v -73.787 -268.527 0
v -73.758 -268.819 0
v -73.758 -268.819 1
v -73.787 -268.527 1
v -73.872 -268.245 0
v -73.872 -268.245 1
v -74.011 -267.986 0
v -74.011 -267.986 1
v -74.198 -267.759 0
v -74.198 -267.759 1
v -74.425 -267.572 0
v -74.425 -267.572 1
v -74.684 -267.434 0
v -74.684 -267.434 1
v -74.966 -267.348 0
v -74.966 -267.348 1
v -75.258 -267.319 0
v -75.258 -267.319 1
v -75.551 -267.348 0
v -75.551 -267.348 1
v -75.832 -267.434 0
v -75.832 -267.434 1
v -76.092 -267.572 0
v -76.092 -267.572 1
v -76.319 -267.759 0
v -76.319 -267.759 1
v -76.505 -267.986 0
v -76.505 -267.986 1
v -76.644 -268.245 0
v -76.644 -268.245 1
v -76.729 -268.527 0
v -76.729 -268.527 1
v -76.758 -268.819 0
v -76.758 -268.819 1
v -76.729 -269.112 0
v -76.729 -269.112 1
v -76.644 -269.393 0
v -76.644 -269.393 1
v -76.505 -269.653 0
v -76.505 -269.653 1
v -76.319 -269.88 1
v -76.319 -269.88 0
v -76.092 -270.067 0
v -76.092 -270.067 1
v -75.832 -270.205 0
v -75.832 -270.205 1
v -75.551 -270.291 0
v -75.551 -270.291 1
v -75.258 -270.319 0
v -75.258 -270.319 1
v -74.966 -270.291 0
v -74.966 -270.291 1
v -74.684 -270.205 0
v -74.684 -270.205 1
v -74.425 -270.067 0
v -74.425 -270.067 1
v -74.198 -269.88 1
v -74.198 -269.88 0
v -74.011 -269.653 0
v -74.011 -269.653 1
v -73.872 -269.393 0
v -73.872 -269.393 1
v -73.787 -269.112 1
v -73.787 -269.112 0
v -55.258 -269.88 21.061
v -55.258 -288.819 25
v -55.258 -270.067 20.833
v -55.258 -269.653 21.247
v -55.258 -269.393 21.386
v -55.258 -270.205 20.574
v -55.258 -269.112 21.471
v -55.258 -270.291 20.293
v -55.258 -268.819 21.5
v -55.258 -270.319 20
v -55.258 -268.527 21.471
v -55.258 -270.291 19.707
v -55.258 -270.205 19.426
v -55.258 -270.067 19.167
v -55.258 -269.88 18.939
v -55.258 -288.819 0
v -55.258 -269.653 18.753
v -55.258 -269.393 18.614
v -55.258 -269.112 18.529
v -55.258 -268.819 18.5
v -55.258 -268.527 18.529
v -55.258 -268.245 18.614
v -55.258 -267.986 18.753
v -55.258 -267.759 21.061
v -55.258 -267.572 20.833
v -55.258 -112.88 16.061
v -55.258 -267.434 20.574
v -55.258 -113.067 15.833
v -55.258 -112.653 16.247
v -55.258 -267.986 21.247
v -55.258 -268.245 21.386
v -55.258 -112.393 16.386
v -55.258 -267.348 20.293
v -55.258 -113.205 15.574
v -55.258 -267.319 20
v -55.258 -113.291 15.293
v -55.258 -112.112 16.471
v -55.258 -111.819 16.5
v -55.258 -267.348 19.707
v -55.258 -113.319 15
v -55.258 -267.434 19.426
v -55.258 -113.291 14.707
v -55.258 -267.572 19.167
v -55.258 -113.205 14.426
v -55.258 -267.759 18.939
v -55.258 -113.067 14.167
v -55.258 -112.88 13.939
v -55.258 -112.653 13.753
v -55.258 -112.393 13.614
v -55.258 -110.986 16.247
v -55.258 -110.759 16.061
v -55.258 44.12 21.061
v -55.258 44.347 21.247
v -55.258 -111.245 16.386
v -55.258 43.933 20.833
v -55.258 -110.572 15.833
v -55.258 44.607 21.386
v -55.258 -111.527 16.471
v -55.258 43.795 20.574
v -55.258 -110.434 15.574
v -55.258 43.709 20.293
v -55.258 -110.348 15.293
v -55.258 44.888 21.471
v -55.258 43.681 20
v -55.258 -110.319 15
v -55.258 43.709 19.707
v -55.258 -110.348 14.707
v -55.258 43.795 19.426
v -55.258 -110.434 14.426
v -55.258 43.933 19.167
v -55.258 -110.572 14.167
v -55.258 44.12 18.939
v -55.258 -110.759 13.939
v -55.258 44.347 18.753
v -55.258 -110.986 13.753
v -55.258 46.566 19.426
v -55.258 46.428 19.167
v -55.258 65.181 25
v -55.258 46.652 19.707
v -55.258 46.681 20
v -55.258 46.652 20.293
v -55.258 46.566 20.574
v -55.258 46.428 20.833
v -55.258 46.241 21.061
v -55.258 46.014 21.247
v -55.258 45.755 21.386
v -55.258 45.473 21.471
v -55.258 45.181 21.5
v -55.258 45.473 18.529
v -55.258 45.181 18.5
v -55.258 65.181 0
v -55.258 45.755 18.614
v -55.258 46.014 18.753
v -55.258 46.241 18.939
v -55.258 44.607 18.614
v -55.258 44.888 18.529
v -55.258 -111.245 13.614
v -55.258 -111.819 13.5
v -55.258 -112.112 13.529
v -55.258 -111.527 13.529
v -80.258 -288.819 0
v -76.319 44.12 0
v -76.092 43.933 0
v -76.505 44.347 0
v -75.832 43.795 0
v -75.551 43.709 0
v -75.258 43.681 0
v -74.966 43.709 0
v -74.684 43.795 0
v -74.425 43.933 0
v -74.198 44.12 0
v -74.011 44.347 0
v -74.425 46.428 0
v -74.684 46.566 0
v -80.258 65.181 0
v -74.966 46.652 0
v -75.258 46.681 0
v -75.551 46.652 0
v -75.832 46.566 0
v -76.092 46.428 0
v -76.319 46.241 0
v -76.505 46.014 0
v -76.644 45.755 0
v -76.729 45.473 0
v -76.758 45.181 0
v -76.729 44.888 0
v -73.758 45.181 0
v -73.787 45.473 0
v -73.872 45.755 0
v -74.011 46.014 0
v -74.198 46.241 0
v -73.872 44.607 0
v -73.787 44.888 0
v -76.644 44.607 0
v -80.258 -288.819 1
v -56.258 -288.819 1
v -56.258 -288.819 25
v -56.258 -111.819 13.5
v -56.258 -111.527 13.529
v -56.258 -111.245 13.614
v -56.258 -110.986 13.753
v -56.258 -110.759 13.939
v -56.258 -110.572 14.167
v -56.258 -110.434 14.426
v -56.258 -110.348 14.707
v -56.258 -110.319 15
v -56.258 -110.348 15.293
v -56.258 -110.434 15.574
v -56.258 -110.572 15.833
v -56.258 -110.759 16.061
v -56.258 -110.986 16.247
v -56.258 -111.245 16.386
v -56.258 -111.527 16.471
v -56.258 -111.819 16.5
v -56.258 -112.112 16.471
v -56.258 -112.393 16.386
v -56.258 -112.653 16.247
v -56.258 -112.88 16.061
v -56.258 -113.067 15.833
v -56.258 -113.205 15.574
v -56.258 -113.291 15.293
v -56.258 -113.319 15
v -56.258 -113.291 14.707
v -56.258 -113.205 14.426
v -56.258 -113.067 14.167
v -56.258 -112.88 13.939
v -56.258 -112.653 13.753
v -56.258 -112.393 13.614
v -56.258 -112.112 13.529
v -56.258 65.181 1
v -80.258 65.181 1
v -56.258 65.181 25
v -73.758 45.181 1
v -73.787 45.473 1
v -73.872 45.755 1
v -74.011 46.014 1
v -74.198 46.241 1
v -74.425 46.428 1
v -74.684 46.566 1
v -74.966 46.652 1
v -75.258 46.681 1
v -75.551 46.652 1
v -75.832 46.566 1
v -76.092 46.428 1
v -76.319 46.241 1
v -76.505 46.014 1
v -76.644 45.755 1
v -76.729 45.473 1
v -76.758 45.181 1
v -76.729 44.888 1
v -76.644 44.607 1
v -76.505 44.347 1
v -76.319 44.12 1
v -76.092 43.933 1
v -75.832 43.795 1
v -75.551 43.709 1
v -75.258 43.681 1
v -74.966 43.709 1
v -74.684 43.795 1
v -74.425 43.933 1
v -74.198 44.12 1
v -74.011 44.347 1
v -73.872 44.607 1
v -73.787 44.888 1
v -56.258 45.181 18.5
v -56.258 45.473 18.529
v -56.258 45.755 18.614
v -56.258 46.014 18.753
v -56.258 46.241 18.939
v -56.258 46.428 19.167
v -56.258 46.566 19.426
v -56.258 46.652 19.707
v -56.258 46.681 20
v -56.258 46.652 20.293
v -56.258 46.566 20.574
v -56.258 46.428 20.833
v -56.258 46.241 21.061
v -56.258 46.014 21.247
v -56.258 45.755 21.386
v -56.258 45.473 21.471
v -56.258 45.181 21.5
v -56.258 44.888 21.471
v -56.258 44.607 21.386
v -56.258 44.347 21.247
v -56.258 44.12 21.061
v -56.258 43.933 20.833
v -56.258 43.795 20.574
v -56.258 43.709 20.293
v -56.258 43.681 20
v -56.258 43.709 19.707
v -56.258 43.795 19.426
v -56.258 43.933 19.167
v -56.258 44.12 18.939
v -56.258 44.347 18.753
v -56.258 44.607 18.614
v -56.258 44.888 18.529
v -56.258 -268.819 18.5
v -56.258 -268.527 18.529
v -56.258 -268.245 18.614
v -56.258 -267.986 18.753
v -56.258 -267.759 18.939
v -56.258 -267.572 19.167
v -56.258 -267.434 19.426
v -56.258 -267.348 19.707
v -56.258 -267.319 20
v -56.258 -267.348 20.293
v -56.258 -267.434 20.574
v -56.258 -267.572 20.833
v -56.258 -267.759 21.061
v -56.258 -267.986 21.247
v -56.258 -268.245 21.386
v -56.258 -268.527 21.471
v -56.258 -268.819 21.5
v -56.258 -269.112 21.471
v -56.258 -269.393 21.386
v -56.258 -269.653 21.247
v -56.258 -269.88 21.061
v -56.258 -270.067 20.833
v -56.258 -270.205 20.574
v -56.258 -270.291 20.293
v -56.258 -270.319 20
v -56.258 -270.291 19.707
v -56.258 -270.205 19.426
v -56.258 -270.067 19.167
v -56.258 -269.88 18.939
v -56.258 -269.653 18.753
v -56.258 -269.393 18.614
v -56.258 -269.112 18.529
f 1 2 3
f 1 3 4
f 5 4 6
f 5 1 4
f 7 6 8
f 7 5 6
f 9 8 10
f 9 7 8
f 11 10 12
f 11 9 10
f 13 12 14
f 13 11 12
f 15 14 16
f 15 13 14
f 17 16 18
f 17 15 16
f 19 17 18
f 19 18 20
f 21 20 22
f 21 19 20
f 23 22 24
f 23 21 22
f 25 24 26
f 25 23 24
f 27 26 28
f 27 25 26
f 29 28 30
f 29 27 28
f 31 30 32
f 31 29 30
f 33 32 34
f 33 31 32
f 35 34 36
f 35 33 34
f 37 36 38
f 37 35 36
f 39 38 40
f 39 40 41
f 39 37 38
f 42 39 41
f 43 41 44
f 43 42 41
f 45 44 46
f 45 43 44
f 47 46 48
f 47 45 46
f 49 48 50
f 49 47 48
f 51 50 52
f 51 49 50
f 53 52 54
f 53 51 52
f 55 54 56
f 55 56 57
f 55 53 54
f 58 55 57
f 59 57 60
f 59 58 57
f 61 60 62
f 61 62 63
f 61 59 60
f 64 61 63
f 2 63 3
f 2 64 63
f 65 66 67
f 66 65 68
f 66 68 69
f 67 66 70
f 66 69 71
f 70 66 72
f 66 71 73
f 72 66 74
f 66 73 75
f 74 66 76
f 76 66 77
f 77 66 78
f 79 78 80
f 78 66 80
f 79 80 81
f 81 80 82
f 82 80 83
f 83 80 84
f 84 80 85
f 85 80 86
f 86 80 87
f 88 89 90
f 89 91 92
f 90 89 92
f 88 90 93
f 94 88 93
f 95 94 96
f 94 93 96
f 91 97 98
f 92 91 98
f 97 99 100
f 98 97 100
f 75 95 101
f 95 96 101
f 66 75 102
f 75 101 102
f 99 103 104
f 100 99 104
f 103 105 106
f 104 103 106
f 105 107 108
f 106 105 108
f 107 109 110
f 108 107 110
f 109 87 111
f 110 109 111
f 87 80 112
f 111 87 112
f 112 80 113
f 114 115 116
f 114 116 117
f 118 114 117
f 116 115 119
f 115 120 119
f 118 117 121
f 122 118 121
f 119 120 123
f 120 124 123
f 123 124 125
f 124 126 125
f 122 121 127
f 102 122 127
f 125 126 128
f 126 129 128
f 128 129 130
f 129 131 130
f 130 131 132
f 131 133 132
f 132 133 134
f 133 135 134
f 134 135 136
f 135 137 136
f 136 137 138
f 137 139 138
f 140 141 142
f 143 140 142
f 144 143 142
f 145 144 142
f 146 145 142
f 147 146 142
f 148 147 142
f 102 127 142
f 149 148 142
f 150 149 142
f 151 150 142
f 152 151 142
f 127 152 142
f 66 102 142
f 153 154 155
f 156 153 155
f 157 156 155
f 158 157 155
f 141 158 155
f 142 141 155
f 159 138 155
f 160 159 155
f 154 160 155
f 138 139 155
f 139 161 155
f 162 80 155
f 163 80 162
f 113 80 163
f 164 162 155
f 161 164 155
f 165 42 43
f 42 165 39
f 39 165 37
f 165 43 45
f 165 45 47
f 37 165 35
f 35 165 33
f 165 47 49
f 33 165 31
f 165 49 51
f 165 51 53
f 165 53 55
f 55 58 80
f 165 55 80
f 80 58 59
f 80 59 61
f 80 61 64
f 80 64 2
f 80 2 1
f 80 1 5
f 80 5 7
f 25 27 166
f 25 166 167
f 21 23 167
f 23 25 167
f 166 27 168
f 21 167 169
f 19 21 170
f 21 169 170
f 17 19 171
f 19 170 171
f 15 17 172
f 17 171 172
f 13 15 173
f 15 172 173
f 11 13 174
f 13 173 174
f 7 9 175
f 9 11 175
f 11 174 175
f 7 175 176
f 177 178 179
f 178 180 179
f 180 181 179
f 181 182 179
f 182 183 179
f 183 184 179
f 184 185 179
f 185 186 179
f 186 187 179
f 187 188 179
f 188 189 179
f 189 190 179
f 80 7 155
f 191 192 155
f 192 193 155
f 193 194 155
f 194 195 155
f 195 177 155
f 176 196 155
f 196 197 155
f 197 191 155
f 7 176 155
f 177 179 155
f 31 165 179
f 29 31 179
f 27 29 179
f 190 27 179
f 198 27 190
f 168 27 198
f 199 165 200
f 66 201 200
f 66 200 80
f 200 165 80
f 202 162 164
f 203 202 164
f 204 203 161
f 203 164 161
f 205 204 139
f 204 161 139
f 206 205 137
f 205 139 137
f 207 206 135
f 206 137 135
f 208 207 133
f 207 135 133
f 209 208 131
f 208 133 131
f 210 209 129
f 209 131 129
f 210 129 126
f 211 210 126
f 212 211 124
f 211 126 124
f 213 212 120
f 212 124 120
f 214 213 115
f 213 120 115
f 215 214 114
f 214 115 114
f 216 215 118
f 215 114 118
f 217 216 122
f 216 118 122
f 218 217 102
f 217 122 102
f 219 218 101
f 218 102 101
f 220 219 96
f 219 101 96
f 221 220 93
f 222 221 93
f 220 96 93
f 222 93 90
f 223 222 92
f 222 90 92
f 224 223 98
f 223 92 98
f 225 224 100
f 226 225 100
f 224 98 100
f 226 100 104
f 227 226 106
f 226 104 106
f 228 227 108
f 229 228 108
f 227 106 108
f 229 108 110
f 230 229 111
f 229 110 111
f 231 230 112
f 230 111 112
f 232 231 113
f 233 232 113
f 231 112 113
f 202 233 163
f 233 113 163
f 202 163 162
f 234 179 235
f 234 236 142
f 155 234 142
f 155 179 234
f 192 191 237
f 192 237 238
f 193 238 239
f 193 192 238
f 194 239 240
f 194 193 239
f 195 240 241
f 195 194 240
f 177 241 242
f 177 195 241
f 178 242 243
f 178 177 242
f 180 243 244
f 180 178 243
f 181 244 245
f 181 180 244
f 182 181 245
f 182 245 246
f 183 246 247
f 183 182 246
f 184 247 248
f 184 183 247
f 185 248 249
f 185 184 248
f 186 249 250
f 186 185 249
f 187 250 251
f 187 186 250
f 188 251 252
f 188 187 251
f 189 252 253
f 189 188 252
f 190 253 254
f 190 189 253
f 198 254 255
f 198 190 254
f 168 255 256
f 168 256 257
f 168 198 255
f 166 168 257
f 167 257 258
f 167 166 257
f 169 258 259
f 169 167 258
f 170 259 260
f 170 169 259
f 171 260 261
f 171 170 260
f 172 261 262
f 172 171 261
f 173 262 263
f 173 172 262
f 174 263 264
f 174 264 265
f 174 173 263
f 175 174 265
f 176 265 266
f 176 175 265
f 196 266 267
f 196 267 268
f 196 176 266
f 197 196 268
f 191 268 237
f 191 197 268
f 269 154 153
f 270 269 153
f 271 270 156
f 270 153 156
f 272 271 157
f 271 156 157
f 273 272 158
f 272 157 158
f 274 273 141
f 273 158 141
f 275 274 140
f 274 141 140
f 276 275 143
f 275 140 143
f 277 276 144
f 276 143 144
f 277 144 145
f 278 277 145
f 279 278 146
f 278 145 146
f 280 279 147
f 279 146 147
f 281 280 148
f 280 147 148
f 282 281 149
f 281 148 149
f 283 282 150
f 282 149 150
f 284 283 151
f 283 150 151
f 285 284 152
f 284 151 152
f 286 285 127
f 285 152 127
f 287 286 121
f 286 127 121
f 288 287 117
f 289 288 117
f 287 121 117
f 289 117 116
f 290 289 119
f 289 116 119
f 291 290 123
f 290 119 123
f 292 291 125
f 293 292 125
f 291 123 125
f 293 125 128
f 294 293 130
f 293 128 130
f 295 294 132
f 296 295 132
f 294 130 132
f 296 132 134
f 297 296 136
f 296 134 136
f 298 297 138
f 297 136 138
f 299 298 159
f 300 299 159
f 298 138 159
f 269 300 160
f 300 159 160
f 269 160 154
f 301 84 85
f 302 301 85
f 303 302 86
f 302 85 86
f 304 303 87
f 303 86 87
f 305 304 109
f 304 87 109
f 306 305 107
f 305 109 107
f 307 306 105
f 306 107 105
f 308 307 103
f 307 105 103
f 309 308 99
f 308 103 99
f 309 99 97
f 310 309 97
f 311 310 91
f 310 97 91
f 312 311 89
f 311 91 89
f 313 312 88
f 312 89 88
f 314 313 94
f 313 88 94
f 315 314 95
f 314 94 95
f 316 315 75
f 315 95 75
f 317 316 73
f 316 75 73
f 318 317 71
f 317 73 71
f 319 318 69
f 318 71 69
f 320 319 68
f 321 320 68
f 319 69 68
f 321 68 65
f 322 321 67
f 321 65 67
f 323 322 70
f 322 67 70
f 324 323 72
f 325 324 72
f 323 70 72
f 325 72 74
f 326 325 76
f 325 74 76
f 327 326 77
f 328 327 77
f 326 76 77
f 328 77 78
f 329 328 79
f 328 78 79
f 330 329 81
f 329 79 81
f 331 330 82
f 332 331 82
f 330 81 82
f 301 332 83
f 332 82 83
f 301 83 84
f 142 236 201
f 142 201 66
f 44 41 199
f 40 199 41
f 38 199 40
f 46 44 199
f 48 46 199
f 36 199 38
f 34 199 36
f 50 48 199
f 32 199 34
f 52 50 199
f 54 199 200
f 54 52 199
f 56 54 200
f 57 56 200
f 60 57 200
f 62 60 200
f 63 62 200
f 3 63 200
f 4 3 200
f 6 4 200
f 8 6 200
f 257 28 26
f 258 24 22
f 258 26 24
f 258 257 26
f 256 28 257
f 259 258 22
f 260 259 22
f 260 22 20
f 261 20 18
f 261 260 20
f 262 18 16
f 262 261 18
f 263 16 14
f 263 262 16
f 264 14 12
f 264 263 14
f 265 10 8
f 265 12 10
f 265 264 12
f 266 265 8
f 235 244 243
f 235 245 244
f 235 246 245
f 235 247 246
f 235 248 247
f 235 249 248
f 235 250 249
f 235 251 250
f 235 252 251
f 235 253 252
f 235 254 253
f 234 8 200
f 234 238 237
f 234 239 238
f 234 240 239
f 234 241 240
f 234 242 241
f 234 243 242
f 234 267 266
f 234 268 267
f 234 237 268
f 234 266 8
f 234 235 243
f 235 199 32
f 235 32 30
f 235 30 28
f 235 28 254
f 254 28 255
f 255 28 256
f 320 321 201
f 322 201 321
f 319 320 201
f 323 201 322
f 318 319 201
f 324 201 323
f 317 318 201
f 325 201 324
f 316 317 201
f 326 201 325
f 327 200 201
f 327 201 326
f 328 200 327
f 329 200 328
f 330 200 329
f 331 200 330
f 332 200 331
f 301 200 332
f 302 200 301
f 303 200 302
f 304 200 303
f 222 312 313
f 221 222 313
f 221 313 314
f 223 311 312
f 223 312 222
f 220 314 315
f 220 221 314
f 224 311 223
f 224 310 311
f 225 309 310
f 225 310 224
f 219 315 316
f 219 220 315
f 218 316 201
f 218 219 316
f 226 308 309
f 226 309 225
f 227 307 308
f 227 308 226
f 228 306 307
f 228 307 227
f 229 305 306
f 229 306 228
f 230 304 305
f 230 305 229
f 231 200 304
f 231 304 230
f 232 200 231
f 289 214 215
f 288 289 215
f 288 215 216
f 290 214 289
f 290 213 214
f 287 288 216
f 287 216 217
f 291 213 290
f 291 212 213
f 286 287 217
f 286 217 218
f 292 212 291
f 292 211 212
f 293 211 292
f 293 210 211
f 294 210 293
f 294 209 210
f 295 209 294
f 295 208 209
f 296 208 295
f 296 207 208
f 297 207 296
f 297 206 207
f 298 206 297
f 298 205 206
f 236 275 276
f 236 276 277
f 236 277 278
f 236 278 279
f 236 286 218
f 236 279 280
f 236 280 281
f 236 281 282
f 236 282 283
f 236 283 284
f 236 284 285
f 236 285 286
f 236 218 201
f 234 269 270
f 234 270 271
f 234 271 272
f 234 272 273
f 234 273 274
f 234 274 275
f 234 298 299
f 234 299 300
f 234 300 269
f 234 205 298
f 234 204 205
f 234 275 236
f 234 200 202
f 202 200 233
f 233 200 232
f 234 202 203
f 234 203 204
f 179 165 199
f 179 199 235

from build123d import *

# Parameters (mm, degrees)
CROQUIS2_W              = 1
CROQUIS2_H              = 354
SALIENTE_EXTRUIR2_DEPTH = 25
CROQUIS5_R              = 1.5
CORTAR_EXTRUIR2_DEPTH   = 1
CROQUIS1_W              = 24
CROQUIS1_H              = 354
CROQUIS1_R              = 1.5
SALIENTE_EXTRUIR3_DEPTH = 1


with BuildPart() as part:
    # Croquis2 → Saliente-Extruir2 (new body)
    with BuildSketch(Plane.XY):
        with Locations((-55.758230402, -111.819349421)):
            Rectangle(CROQUIS2_W, CROQUIS2_H)
    extrude(amount=SALIENTE_EXTRUIR2_DEPTH)

    # Croquis5 → Cortar-Extruir2 (cut)
    with BuildSketch(Plane(origin=(-55.258230402, 0, 0), x_dir=(0, 0, -1), z_dir=(1, 0, 0))):
        with Locations((-20, 45.180650579)):
            Circle(CROQUIS5_R)
        with Locations((-20, -268.819349421)):
            Circle(CROQUIS5_R)
        with Locations((-15, -111.819349421)):
            Circle(CROQUIS5_R)
    extrude(amount=-CORTAR_EXTRUIR2_DEPTH, mode=Mode.SUBTRACT)

    # Croquis1 → Saliente-Extruir3 (add)
    with BuildSketch(Plane.XY):
        with Locations((-68.258230402, -111.819349421)):
            Rectangle(CROQUIS1_W, CROQUIS1_H)
        with Locations((-75.258230402, 45.180650579)):
            Circle(CROQUIS1_R, mode=Mode.SUBTRACT)
        with Locations((-75.258230402, -268.819349421)):
            Circle(CROQUIS1_R, mode=Mode.SUBTRACT)
    extrude(amount=SALIENTE_EXTRUIR3_DEPTH)


solid = part.part
